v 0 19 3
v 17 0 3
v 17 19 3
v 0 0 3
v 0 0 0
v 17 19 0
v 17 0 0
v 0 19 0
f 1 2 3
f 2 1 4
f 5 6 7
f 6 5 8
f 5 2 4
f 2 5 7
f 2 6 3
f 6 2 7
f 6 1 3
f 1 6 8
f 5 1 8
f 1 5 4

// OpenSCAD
// Generated by SolidPython 1.0.1 on 2020-07-29 00:46:56


cube(size = [17, 19, 3]);
/***********************************************
*********      SolidPython code:      **********
************************************************
 
# import packages: SolidPython
from solid import *
from solid.utils import *
from itertools import chain, combinations, permutations


class Resize:

    def __init__(self, scad_file):
        self.scad_file = scad_file
        #self.scad_file = import_scad(scad_file)
        # cone/cylinder param:
        self.r1 = 0
        self.r2 = 0
        self.h = 0
        # rectangular prism param:
        self.w = 0
        self.l = 0
        # ellipse param:
        self.r = 0

    # import OpenScad code (file name corresponds to shape)


    # classify shape + parameters
    def assign(self, param1, param2, param3):
        if self.scad_file == 'cone.scad':
            self.r1 = param1
            self.r2 = param2
            self.h = param3
        elif self.scad_file == 'cylinder.scad':
            self.r1 = param1
            self.r2 = param2
            self.h = param3
        elif self.scad_file == 'rectangularPrism.scad':
            self.h = param1
            self.l = param2
            self.w = param3
        else:
            self.r = param1
            self.h = param2

    # resize parameters
    def iterate(self):
        x = range(3, 20, 2)
        i = 1
        if self.scad_file == 'cone.scad':
            tempList = list(permutations(x, 2))
            for temp in tempList:
                param1 = temp[0]
                param2 = temp[1]
                filepath = 'produced_scad_files/' + 'cone' + str(param1) + '_' + str(param2) + '_' + '.scad'
                scad_render_to_file(cylinder(h=param1, r1=param2, r2=0), filepath)

        elif self.scad_file == 'cylinder.scad':
            tempList = list(permutations(x, 3))
            for temp in tempList:
                param1 = temp[0]
                param2 = temp[1]
                filepath = 'produced_scad_files/' + 'cylinder' + str(param1) + '_' + str(param2) + '_' + '.scad'
                scad_render_to_file(cylinder(h=param1, r1=param2, r2=param2), filepath)

        elif self.scad_file == 'rectangularPrism.scad':
            tempList = list(permutations(x, 3))
            for temp in tempList:
                param1 = temp[0]
                param2 = temp[1]
                param3 = temp[2]
                filepath = 'produced_scad_files/' + 'rectangularPrism' + str(param1) + '_' + str(param2) + '_' + str(
                    param3) + '.scad'
                scad_render_to_file(cube(size=(param1, param2, param3)), filepath)

        elif self.scad_file == 'ellipse.scad':
            tempList = list(permutations(x, 4))
            for temp in tempList:
                param1 = temp[0]
                param2 = temp[1]
                param3 = temp[2]
                param4 = temp[3]
                filepath = 'produced_scad_files/' + 'ellipse' + str(param1) + '_' + str(param2) + '_' + str(param3) + '_' + str(param4) + '.scad'
                scad_render_to_file(scale([param1, param2, param3])(sphere(r=param4)), filepath)

    def render_to_scadfile(self):
        scad_render_to_file(scad, 'example.scad') 
 
************************************************/
